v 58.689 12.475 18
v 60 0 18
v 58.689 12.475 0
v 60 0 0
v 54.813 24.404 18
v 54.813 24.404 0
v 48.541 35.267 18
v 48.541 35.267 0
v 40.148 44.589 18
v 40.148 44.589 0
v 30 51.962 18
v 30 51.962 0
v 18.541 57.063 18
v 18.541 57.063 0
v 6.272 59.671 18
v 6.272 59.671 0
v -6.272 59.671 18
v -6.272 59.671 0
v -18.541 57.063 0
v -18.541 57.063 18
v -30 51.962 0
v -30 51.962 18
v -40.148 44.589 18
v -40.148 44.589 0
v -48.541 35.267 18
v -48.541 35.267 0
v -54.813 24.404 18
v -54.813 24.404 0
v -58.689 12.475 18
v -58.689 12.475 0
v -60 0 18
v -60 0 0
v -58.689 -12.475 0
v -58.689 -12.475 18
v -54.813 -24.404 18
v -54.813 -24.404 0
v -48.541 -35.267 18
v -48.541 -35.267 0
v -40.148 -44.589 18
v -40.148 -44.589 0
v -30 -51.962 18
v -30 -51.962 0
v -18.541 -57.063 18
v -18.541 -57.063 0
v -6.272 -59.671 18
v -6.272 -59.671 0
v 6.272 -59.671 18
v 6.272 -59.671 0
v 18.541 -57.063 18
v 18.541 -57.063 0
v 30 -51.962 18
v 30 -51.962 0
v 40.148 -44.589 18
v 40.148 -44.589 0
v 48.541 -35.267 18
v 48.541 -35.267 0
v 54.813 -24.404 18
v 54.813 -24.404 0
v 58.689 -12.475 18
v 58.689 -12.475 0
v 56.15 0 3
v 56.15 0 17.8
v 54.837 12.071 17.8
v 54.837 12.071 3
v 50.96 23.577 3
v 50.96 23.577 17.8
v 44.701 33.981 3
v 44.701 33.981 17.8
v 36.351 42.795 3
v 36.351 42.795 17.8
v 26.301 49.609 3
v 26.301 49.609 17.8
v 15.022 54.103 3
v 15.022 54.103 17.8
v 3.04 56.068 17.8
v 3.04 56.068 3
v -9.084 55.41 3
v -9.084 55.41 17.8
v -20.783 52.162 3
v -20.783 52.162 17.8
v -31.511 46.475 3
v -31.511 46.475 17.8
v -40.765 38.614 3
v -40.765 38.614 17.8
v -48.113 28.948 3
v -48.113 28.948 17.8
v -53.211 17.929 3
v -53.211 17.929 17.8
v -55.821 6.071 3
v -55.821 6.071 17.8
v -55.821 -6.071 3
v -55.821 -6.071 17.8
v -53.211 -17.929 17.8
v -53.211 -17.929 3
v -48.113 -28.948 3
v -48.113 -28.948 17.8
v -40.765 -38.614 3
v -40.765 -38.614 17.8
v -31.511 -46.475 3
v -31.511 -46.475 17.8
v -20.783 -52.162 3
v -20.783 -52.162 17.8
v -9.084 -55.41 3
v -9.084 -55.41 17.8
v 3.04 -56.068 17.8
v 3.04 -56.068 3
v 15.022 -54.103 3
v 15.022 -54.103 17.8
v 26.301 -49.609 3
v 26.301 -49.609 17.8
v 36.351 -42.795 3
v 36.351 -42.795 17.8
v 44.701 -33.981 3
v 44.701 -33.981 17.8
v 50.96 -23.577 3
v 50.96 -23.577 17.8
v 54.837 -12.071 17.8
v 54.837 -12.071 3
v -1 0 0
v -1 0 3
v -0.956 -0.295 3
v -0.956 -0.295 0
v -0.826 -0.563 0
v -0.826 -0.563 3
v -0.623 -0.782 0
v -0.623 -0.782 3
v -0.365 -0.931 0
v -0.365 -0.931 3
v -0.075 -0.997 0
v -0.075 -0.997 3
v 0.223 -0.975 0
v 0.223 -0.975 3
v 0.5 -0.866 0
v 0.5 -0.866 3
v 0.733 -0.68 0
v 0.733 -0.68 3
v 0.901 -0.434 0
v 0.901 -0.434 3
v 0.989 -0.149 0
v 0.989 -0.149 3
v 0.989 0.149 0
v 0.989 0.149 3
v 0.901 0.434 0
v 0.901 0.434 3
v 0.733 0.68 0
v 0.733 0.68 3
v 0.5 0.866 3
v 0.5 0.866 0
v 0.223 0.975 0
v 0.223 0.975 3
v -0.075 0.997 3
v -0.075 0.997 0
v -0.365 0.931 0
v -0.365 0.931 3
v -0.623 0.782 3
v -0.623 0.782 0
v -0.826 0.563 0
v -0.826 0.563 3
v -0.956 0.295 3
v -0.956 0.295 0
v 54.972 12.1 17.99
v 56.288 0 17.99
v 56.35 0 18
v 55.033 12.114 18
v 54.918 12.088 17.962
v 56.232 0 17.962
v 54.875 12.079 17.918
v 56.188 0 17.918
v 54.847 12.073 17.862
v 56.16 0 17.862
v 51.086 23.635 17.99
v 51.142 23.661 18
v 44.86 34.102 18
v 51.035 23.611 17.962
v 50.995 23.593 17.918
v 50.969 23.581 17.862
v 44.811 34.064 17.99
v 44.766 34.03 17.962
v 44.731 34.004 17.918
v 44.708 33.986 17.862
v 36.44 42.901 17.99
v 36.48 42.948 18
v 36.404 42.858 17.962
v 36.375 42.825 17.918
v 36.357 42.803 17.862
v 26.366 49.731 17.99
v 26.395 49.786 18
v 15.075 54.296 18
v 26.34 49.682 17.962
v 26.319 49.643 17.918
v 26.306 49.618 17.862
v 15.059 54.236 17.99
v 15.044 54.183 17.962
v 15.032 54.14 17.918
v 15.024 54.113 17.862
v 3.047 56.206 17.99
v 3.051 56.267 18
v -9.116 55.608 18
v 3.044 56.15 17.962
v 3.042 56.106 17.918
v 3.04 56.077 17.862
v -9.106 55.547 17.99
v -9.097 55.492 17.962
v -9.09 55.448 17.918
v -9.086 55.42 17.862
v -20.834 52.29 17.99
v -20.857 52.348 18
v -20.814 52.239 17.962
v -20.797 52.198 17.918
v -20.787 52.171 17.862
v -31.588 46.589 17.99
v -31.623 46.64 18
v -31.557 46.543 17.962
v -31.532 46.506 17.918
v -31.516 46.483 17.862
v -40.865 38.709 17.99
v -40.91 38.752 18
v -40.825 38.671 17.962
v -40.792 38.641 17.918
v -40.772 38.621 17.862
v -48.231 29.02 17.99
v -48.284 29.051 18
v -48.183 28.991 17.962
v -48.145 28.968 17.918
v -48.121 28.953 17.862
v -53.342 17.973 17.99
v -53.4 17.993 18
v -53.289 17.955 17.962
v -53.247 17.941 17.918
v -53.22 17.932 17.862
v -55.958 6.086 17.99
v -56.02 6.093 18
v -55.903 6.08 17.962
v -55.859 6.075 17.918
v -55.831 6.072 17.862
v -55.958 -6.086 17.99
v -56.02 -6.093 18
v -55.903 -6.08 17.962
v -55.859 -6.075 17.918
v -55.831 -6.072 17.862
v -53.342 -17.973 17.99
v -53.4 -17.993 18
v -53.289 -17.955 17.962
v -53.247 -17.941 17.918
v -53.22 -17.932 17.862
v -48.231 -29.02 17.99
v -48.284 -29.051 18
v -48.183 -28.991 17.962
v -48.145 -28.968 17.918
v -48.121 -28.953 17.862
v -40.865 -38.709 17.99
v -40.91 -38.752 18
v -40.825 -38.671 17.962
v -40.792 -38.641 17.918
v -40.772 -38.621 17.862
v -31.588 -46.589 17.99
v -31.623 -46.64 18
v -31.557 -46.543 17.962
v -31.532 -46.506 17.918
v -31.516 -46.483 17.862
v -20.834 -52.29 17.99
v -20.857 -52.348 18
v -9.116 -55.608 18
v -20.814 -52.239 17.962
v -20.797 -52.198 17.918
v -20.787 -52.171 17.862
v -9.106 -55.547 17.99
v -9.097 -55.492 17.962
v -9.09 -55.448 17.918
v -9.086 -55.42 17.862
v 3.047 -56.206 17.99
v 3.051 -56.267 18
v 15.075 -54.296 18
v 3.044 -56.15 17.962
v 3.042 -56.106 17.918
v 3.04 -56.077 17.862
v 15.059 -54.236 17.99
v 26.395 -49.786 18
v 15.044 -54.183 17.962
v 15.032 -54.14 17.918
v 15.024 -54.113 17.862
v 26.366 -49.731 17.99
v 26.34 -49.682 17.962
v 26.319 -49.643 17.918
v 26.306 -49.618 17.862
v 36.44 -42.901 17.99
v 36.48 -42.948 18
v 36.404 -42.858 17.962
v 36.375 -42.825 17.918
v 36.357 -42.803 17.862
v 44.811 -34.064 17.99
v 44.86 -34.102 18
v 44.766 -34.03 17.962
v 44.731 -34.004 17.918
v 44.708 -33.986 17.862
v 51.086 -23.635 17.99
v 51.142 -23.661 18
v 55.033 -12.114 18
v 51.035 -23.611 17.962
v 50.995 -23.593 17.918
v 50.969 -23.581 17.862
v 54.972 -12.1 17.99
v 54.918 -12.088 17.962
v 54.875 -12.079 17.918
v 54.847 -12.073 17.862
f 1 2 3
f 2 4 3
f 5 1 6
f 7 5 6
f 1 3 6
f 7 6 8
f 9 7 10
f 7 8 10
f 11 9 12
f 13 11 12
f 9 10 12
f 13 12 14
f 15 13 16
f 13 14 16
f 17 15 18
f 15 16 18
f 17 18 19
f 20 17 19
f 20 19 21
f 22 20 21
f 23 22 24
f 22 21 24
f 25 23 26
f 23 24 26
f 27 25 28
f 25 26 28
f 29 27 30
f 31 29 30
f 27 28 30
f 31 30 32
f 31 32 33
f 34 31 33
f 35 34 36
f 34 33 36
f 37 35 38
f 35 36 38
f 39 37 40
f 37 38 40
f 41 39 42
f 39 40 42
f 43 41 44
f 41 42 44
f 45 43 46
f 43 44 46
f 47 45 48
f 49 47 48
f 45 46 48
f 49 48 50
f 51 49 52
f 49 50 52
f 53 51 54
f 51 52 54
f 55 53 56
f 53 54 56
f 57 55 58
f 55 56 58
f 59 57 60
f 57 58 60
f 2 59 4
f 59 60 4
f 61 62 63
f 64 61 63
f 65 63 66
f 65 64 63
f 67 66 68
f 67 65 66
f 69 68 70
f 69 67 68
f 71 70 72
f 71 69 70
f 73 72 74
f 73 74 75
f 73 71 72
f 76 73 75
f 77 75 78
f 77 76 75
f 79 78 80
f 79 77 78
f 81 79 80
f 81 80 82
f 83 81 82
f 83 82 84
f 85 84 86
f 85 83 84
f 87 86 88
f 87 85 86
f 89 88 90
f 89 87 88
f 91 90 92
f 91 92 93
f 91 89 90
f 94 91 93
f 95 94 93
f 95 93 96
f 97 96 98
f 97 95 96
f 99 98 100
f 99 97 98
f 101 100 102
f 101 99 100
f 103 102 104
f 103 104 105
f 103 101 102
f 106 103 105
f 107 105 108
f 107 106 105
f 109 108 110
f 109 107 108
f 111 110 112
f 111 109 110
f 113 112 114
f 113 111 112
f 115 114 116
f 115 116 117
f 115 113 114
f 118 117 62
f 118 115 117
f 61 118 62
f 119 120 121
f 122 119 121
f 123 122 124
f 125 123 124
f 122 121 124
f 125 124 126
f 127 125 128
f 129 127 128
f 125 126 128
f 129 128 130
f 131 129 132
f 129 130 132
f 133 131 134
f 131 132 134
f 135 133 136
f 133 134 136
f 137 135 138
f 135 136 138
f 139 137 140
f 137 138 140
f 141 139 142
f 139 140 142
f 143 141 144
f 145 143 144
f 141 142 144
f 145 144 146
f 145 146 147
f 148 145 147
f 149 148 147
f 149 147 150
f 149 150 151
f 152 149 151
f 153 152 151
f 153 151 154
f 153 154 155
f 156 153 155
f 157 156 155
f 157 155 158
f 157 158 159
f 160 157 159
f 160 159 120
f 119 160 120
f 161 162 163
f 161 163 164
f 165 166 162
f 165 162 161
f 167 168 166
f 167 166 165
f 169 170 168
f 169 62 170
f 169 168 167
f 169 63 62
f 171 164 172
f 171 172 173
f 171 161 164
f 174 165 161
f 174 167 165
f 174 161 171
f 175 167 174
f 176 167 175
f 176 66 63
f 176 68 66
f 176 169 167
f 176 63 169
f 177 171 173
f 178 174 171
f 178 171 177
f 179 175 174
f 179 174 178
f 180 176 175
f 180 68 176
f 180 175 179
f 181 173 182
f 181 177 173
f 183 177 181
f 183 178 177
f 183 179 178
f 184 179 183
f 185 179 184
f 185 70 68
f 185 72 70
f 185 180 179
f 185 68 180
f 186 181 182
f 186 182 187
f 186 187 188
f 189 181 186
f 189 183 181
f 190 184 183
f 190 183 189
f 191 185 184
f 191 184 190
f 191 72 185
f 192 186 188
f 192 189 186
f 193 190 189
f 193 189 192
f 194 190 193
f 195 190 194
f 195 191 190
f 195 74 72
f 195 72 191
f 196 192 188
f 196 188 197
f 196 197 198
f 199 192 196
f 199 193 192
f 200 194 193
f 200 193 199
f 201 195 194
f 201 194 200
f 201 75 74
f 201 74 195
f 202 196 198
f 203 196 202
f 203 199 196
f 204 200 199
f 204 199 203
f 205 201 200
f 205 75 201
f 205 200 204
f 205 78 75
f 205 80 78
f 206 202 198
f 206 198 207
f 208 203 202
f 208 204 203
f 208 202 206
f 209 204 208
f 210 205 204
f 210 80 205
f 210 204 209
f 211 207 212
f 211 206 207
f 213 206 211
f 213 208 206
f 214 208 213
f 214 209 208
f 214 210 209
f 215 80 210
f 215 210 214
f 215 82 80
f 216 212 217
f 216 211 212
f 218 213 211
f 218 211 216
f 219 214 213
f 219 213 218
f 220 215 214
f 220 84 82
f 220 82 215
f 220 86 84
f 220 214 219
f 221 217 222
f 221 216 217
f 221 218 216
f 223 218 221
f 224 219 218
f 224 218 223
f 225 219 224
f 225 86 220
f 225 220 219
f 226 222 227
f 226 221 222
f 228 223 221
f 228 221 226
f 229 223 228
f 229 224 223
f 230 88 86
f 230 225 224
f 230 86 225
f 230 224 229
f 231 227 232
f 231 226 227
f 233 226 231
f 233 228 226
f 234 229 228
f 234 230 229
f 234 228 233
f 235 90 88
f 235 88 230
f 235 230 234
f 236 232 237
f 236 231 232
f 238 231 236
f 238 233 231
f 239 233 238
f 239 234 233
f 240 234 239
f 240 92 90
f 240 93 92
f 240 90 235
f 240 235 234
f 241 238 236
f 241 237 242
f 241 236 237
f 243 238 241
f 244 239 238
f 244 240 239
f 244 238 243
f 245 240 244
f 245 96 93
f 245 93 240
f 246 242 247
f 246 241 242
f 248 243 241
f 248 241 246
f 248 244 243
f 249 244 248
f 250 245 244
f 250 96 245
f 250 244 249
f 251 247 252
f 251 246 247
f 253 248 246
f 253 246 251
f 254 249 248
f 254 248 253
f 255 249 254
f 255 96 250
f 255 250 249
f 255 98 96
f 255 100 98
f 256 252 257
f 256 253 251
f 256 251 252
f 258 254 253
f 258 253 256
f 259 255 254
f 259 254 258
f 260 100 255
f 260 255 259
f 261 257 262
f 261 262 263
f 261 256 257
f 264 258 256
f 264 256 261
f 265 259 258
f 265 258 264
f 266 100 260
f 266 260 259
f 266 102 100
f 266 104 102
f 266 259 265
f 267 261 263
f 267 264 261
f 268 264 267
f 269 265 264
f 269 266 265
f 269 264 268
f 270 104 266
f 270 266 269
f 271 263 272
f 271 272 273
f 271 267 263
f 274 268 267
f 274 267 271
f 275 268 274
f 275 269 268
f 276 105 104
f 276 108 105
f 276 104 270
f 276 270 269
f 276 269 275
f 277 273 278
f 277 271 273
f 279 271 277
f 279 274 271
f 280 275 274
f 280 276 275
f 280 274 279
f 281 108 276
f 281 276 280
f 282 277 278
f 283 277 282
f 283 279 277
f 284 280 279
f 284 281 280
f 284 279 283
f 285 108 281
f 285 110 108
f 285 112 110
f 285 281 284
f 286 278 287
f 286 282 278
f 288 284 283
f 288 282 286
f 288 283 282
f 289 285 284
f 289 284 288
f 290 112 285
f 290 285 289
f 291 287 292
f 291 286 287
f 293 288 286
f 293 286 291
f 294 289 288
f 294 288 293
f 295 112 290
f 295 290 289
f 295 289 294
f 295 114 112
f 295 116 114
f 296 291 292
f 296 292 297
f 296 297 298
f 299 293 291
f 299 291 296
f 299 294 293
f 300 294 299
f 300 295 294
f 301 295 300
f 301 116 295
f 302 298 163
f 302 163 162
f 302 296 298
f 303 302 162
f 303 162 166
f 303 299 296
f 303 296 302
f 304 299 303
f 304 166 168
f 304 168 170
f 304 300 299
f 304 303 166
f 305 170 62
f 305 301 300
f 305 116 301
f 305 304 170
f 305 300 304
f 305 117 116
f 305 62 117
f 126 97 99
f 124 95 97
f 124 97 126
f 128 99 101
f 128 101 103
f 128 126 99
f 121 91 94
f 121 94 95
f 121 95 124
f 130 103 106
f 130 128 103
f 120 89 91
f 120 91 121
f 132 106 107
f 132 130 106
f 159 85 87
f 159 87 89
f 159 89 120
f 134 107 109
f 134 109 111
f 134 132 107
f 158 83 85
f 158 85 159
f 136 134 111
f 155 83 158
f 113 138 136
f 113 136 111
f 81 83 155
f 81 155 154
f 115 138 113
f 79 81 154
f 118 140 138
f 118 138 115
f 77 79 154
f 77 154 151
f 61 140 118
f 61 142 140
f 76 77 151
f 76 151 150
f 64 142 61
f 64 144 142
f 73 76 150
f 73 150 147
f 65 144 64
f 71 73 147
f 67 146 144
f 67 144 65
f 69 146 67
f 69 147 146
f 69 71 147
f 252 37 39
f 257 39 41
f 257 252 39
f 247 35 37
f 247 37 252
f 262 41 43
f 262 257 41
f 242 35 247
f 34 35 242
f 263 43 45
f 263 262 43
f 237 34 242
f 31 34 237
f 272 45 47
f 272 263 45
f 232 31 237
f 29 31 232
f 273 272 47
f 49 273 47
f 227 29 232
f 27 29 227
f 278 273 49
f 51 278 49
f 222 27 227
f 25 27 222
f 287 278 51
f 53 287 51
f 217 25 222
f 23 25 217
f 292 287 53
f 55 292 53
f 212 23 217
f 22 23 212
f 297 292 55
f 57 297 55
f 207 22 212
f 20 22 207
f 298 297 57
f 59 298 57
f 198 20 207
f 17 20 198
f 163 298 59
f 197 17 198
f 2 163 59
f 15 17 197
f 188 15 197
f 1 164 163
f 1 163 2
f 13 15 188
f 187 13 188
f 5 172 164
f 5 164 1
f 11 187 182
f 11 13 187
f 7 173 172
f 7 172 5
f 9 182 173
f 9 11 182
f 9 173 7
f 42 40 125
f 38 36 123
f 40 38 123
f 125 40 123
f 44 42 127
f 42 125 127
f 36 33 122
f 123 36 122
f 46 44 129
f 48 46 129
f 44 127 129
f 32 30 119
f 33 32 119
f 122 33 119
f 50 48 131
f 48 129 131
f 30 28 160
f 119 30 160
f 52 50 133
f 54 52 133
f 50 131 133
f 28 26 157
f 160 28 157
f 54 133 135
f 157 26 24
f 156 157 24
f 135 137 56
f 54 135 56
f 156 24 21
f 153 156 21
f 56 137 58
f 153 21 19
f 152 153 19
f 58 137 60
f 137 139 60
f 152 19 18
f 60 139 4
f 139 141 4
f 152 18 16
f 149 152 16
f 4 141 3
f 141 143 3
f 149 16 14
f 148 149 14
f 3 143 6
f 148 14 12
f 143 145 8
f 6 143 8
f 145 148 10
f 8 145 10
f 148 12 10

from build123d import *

# Parameters (mm, degrees)
F0_R     = 60
F1_DEPTH = 3
F2_R     = 60
F2_R_2   = 56.15
F3_DEPTH = 15
F5_D     = 2
F6_R     = 0.2


with BuildPart() as f1:
    # F0 (on Top) → F1 (new body)
    with BuildSketch(Plane.XY):
        Circle(F0_R)
    extrude(amount=F1_DEPTH)

    # F2 (on face) → F3 (join)
    with BuildSketch(Plane.XY.offset(3)):
        Circle(F2_R)
        Circle(F2_R_2, mode=Mode.SUBTRACT)
    extrude(amount=F3_DEPTH)

    # F5 (through all)
    with Locations(Plane(origin=(0, 0, 0), x_dir=(1, 0, 0), z_dir=(0, 0, -1))):
        with Locations((0, 0)):
            Hole(F5_D / 2)

    # F6
    f6_edges = [f1.edges().sort_by_distance(p)[0] for p in [
        (-56.15, 0, 18),
    ]]
    fillet(f6_edges, radius=F6_R)


solid = f1.part
